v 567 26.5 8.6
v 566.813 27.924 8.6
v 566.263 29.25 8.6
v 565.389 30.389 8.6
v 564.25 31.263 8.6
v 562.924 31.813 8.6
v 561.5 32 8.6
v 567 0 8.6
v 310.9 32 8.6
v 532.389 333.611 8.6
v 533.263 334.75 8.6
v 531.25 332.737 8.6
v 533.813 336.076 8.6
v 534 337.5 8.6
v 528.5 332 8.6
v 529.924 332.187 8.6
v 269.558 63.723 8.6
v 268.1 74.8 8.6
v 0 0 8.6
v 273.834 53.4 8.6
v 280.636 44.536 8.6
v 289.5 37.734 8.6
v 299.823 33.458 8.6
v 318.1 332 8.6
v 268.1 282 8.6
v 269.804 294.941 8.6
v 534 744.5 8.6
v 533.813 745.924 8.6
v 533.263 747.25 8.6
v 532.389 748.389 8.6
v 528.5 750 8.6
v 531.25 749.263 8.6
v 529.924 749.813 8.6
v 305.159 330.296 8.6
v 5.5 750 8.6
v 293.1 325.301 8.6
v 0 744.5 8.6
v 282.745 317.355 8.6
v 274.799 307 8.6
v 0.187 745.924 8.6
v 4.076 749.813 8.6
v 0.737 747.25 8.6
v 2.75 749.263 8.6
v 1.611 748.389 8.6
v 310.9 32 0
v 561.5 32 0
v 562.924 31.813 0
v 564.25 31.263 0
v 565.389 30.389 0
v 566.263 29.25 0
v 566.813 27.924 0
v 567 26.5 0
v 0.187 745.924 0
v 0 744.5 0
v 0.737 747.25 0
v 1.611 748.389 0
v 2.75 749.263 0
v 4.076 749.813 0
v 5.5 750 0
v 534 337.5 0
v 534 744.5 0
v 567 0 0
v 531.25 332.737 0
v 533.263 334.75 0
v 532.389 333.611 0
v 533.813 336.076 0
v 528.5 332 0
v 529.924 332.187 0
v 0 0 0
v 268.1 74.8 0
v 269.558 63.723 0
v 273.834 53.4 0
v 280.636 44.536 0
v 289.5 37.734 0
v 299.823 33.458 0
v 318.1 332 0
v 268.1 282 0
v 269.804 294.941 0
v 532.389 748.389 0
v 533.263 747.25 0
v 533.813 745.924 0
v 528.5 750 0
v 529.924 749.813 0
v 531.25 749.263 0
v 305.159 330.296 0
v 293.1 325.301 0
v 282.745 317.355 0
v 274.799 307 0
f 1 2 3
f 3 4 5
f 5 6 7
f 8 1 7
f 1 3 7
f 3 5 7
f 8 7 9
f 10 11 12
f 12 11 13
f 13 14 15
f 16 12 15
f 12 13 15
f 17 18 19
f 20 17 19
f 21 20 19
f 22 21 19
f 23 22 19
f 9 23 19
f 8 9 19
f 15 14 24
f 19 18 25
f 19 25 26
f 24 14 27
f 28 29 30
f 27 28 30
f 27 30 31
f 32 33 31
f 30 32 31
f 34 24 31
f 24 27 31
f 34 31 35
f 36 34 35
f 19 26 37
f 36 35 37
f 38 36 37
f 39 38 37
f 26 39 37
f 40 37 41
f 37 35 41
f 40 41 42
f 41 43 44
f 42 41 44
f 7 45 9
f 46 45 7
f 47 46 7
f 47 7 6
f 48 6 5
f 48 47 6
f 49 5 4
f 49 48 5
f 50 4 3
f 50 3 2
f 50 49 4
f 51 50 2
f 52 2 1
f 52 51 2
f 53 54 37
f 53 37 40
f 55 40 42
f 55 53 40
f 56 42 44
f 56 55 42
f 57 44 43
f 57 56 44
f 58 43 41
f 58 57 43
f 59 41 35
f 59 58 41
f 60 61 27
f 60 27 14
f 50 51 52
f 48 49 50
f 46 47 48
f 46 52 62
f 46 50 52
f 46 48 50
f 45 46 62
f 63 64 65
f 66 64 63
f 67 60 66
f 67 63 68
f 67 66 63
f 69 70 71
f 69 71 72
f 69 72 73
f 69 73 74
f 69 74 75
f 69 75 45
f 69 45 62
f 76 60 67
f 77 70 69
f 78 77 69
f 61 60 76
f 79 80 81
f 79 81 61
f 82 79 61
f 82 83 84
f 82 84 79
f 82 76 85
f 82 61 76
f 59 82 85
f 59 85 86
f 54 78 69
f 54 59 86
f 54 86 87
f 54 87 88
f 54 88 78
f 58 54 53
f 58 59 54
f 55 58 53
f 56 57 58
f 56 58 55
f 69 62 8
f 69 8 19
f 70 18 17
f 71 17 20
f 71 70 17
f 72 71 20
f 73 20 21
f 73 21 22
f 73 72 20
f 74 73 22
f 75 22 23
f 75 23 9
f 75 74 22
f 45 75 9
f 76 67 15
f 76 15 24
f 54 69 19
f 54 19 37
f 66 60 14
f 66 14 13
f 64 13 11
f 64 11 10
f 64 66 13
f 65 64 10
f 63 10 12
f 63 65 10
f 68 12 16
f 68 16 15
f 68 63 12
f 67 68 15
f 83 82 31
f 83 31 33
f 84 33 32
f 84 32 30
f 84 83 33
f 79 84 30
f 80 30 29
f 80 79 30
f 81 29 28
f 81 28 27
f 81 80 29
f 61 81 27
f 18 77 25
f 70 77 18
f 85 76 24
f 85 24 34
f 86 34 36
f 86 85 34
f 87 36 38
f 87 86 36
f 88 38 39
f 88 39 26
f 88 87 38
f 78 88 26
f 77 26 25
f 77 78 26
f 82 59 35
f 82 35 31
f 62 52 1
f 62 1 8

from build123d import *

# Parameters (mm, degrees)
BOSS_EXTRUDE1_DEPTH = 8.6


with BuildPart() as part:
    # Sketch1 → Boss-Extrude1 (new body)
    with BuildSketch(Plane.XY):
        with BuildLine():
            Line((0, 0), (0, 744.5))
            ThreePointArc((0, 744.5), (1.610912703, 748.389087297), (5.5, 750))
            Line((5.5, 750), (528.5, 750))
            ThreePointArc((528.5, 750), (532.389087297, 748.389087297), (534, 744.5))
            Line((534, 744.5), (534, 337.5))
            ThreePointArc((534, 337.5), (532.389087297, 333.610912703), (528.5, 332))
            Line((528.5, 332), (318.1, 332))
            ThreePointArc((318.1, 332), (282.744660941, 317.355339059), (268.1, 282))
            Line((268.1, 282), (268.1, 74.8))
            ThreePointArc((268.1, 74.8), (280.635829765, 44.535829765), (310.9, 32))
            Line((310.9, 32), (313, 32))
            Line((313, 32), (561.5, 32))
            ThreePointArc((561.5, 32), (565.389087297, 30.389087297), (567, 26.5))
            Line((567, 26.5), (567, 0))
            Line((567, 0), (0, 0))
        make_face()
    extrude(amount=BOSS_EXTRUDE1_DEPTH)


solid = part.part
